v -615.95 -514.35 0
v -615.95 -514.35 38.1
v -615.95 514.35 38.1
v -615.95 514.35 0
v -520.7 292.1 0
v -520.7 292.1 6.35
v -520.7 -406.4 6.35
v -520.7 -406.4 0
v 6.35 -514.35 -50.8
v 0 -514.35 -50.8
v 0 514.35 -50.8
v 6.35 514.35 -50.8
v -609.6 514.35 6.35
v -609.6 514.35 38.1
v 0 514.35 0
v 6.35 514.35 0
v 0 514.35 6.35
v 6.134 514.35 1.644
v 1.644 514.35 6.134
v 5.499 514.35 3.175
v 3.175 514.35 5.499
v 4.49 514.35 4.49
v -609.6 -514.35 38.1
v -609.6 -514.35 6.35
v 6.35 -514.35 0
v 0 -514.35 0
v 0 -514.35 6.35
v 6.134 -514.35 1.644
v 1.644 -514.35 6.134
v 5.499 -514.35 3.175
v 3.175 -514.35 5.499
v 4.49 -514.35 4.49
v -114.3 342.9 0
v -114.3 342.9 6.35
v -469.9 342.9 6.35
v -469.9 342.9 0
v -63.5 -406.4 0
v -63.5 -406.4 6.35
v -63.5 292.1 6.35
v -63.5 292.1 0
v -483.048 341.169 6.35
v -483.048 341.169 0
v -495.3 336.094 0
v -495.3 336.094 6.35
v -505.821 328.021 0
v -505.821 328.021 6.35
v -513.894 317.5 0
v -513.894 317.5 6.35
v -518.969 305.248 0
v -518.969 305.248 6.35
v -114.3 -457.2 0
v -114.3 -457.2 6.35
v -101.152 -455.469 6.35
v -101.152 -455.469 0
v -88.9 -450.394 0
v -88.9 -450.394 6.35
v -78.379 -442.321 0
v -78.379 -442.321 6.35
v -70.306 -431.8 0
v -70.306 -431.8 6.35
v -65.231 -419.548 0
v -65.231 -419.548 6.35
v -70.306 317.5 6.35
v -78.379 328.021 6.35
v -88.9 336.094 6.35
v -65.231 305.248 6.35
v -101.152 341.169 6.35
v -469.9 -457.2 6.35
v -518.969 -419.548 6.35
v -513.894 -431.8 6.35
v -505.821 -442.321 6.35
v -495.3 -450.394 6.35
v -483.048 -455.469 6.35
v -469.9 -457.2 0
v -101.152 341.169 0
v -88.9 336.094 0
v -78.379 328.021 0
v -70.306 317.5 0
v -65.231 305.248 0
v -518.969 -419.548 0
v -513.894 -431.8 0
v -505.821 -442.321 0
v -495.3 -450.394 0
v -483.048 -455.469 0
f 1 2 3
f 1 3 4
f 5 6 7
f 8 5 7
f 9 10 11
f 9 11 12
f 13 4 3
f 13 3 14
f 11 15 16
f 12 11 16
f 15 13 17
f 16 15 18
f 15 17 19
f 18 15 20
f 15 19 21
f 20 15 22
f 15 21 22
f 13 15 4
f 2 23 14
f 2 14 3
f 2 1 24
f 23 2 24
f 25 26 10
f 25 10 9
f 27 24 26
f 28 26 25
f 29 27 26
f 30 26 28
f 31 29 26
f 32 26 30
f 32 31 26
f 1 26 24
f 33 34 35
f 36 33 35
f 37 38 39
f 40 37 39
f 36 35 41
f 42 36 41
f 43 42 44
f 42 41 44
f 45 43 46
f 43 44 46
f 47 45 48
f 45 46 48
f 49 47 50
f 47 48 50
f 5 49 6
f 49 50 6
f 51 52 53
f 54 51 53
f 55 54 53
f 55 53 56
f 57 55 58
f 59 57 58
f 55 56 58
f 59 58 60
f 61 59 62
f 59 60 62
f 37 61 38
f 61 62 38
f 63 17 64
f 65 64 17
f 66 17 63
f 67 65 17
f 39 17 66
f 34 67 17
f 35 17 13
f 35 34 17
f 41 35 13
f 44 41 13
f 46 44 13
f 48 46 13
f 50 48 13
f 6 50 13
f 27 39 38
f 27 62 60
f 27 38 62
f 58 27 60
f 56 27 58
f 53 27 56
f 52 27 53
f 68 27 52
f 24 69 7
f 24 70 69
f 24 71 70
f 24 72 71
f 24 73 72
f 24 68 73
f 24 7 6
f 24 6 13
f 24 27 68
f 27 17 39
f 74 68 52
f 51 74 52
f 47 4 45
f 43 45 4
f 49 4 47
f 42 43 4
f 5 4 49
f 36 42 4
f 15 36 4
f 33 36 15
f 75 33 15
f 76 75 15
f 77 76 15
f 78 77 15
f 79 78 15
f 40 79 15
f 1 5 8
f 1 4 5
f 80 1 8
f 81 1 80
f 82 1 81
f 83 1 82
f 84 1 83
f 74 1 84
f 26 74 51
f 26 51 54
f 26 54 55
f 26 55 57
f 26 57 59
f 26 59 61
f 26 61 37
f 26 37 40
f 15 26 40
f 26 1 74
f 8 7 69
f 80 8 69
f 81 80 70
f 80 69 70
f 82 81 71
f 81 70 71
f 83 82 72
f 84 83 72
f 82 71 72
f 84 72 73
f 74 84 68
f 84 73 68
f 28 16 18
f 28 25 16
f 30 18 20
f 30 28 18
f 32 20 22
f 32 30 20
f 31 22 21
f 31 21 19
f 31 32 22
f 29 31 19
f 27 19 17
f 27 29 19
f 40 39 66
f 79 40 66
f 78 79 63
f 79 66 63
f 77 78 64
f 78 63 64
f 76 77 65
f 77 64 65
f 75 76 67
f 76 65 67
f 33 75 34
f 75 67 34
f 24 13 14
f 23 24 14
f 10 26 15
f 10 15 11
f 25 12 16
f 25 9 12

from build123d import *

# Parameters (mm, degrees)
F1_DEPTH = 514.35
F3_DEPTH = 25.4


with BuildPart() as f1:
    # F0 (on Front) → F1 (new body, symmetric)
    with BuildSketch(Plane.XZ):
        with BuildLine():
            Line((0, 6.35), (-609.6, 6.35))
            Line((-609.6, 6.35), (-609.6, 38.1))
            Line((-609.6, 38.1), (-615.95, 38.1))
            Line((-615.95, 38.1), (-615.95, 0))
            Line((-615.95, 0), (0, 0))
            Line((0, 0), (0, -50.8))
            Line((0, -50.8), (6.35, -50.8))
            Line((6.35, -50.8), (6.35, 0))
            ThreePointArc((6.35, 0), (4.4901280605, 4.4901280605), (0, 6.35))
        make_face()
    extrude(amount=F1_DEPTH, both=True)

    # F2 (on face) → F3 (cut)
    with BuildSketch(Plane.XY.offset(6.35)):
        with BuildLine():
            Line((-114.3, 342.9), (-469.9, 342.9))
            ThreePointArc((-469.9, 342.9), (-505.8210244843, 328.0210244843), (-520.7, 292.1))
            Line((-520.7, 292.1), (-520.7, -406.4))
            ThreePointArc((-520.7, -406.4), (-505.8210244843, -442.3210244843), (-469.9, -457.2))
            Line((-469.9, -457.2), (-114.3, -457.2))
            ThreePointArc((-114.3, -457.2), (-78.3789755157, -442.3210244843), (-63.5, -406.4))
            Line((-63.5, -406.4), (-63.5, 292.1))
            ThreePointArc((-63.5, 292.1), (-78.3789755157, 328.0210244843), (-114.3, 342.9))
        make_face()
    extrude(amount=-F3_DEPTH, mode=Mode.SUBTRACT)


solid = f1.part
